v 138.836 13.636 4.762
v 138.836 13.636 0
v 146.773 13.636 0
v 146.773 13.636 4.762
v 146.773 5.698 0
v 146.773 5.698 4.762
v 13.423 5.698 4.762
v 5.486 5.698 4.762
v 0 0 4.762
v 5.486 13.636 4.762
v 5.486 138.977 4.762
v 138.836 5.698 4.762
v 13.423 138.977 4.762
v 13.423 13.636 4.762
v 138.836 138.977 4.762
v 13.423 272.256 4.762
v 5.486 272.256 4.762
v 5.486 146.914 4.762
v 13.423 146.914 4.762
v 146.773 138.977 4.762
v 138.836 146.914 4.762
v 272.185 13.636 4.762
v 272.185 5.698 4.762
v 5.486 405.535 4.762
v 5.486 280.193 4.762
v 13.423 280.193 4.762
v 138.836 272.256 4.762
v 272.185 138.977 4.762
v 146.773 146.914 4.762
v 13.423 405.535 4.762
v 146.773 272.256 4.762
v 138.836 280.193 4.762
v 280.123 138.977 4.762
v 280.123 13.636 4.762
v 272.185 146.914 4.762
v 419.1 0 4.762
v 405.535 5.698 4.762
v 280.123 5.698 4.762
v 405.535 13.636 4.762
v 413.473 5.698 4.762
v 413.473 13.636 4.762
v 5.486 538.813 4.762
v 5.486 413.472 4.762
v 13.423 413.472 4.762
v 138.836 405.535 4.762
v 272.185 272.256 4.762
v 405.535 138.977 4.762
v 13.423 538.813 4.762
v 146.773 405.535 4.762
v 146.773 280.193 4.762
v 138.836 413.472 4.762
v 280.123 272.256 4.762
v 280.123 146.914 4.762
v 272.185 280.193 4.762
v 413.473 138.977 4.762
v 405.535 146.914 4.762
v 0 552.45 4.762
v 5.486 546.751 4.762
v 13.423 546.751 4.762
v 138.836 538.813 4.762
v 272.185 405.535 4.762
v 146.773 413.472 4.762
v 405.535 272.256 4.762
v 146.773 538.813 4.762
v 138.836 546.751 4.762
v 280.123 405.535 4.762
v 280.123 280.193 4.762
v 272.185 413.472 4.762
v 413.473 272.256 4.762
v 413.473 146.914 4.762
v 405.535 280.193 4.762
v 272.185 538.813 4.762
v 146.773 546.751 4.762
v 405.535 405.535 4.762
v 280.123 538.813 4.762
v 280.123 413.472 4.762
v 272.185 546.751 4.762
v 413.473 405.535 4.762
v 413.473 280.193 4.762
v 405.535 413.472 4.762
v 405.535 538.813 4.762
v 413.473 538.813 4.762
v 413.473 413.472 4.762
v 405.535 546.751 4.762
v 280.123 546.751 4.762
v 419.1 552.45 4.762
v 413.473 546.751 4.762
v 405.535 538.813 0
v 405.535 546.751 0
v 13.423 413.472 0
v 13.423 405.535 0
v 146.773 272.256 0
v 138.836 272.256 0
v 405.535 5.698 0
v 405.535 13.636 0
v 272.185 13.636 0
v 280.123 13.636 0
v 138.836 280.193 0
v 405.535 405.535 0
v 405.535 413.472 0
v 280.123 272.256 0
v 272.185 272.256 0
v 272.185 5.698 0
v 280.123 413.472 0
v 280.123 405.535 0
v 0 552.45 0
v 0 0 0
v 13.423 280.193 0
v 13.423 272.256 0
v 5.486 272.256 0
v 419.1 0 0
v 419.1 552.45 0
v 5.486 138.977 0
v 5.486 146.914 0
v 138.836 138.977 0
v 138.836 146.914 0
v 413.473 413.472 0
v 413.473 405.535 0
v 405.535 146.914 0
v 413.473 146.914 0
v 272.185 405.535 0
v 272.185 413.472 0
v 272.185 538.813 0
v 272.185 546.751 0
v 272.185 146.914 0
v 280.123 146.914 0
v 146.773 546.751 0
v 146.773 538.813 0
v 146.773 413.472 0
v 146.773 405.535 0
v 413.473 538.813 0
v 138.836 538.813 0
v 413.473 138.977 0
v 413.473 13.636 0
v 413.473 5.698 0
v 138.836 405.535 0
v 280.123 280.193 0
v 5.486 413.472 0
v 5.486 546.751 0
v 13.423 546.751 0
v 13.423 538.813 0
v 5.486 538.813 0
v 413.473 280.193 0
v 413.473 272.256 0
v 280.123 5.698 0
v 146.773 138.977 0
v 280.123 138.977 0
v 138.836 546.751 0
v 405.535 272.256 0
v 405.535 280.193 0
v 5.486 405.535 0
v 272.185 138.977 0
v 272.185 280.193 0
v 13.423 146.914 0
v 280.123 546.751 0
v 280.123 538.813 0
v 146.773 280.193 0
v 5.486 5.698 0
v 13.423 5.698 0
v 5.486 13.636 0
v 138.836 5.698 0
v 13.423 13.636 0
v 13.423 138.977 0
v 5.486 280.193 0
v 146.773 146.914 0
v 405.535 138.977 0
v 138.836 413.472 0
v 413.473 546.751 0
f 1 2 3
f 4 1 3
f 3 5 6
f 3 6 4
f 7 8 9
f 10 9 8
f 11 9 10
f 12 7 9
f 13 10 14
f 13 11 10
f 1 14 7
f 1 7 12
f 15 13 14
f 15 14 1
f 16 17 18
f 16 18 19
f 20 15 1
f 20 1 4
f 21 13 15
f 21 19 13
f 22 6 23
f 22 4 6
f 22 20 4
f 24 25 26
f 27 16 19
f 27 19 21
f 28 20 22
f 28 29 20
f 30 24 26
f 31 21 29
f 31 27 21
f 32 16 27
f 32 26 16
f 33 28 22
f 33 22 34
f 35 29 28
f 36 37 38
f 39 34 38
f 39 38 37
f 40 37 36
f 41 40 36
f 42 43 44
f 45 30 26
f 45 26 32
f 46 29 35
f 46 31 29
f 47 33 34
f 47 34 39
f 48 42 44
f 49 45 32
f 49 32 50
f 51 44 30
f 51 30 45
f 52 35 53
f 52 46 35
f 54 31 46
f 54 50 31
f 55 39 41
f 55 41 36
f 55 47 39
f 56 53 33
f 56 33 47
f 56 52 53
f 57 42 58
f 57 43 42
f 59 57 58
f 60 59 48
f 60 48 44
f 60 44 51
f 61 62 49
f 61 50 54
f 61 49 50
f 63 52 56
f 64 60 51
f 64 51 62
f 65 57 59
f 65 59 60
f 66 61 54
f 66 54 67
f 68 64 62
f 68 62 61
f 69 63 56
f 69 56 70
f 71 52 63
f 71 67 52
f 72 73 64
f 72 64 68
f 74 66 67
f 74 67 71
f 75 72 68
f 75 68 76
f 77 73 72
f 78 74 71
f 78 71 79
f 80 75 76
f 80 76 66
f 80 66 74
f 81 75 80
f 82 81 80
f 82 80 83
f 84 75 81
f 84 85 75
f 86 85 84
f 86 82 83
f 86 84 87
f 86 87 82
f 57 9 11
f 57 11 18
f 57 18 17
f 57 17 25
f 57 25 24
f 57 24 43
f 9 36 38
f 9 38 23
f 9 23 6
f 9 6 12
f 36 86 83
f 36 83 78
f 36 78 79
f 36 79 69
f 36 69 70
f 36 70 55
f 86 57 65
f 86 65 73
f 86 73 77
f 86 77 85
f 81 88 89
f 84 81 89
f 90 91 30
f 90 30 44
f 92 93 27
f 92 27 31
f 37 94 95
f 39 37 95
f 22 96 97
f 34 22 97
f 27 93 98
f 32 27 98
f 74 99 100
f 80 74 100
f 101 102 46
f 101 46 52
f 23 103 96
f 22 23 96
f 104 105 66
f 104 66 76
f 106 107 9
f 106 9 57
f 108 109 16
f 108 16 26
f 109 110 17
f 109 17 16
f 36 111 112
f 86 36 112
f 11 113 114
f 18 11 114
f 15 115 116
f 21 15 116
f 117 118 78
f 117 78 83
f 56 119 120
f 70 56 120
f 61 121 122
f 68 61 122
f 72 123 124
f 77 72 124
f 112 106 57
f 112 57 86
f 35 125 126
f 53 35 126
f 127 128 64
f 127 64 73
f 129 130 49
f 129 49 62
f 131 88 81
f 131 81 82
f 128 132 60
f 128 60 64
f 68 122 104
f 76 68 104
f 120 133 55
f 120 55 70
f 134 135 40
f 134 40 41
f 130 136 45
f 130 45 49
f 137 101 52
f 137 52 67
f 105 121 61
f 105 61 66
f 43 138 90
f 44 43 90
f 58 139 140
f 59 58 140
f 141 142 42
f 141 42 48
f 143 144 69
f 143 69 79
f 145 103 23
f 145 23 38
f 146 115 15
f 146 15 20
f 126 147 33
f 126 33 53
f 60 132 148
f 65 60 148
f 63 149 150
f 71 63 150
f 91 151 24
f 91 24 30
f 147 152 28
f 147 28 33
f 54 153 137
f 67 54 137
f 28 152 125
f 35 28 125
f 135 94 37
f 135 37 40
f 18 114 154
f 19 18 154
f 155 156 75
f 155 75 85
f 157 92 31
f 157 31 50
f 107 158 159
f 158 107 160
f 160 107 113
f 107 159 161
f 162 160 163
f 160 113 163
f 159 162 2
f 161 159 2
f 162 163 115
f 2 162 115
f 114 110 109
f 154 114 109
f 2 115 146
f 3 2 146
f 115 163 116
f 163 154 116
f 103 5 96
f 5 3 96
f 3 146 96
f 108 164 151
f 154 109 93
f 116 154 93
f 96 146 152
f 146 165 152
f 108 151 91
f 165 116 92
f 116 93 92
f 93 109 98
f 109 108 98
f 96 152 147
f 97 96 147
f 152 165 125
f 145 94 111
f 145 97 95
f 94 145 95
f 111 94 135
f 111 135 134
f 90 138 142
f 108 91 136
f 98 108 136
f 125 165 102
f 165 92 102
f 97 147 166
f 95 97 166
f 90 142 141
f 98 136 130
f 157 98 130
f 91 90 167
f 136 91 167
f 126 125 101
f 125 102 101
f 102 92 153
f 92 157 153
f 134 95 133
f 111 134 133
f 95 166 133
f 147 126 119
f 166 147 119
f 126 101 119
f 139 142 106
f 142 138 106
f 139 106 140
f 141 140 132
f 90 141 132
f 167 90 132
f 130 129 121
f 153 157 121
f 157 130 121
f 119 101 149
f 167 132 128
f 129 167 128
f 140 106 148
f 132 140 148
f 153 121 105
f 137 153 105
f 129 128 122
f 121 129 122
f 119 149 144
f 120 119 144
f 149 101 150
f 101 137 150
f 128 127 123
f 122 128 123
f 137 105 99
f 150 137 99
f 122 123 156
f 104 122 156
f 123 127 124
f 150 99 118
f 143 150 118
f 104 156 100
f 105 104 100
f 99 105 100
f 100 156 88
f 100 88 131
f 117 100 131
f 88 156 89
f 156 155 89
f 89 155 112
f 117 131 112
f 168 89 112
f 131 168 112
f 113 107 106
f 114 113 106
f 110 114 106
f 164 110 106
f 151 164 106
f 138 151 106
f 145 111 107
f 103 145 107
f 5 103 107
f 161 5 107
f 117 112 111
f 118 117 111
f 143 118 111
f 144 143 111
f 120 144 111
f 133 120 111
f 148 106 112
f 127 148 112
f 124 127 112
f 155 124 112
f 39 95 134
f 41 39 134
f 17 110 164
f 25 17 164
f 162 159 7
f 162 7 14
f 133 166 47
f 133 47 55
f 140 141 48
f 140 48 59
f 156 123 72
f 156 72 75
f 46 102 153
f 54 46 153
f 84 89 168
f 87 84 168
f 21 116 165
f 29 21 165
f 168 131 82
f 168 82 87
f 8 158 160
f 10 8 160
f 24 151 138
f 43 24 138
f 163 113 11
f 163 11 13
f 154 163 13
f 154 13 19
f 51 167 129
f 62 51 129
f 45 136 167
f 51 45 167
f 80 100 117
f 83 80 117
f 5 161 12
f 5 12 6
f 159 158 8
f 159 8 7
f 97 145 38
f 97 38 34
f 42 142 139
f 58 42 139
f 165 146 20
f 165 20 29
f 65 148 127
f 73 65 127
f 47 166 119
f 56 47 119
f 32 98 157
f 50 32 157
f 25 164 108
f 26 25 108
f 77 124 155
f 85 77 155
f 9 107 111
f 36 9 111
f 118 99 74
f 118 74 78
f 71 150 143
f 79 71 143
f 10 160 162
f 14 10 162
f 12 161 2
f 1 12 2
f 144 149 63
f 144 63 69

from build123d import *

# Parameters (mm, degrees)
F0_W     = 419.1
F0_H     = 552.45
F0_W_2   = 7.9375
F0_H_2   = 7.9375
F1_DEPTH = 4.7625


with BuildPart() as f1:
    # F0 (on Top) → F1 (new body)
    with BuildSketch(Plane.XY):
        with Locations((209.55, 276.225)):
            Rectangle(F0_W, F0_H)
        with Locations((9.454559, 9.666916)):
            Rectangle(F0_W_2, F0_H_2, mode=Mode.SUBTRACT)
        with Locations((142.804305, 9.666916)):
            Rectangle(F0_W_2, F0_H_2, mode=Mode.SUBTRACT)
        with Locations((9.454559, 142.945695)):
            Rectangle(F0_W_2, F0_H_2, mode=Mode.SUBTRACT)
        with Locations((9.454559, 276.224473)):
            Rectangle(F0_W_2, F0_H_2, mode=Mode.SUBTRACT)
        with Locations((142.804305, 142.945695)):
            Rectangle(F0_W_2, F0_H_2, mode=Mode.SUBTRACT)
        with Locations((142.804305, 276.224473)):
            Rectangle(F0_W_2, F0_H_2, mode=Mode.SUBTRACT)
        with Locations((276.154051, 9.666916)):
            Rectangle(F0_W_2, F0_H_2, mode=Mode.SUBTRACT)
        with Locations((409.503797, 9.666916)):
            Rectangle(F0_W_2, F0_H_2, mode=Mode.SUBTRACT)
        with Locations((276.154051, 142.945695)):
            Rectangle(F0_W_2, F0_H_2, mode=Mode.SUBTRACT)
        with Locations((276.154051, 276.224473)):
            Rectangle(F0_W_2, F0_H_2, mode=Mode.SUBTRACT)
        with Locations((409.503797, 142.945695)):
            Rectangle(F0_W_2, F0_H_2, mode=Mode.SUBTRACT)
        with Locations((409.503797, 276.224473)):
            Rectangle(F0_W_2, F0_H_2, mode=Mode.SUBTRACT)
        with Locations((9.454559, 409.503252)):
            Rectangle(F0_W_2, F0_H_2, mode=Mode.SUBTRACT)
        with Locations((142.804305, 409.503252)):
            Rectangle(F0_W_2, F0_H_2, mode=Mode.SUBTRACT)
        with Locations((9.454559, 542.78203)):
            Rectangle(F0_W_2, F0_H_2, mode=Mode.SUBTRACT)
        with Locations((142.804305, 542.78203)):
            Rectangle(F0_W_2, F0_H_2, mode=Mode.SUBTRACT)
        with Locations((276.154051, 409.503252)):
            Rectangle(F0_W_2, F0_H_2, mode=Mode.SUBTRACT)
        with Locations((409.503797, 409.503252)):
            Rectangle(F0_W_2, F0_H_2, mode=Mode.SUBTRACT)
        with Locations((276.154051, 542.78203)):
            Rectangle(F0_W_2, F0_H_2, mode=Mode.SUBTRACT)
        with Locations((409.503797, 542.78203)):
            Rectangle(F0_W_2, F0_H_2, mode=Mode.SUBTRACT)
    extrude(amount=F1_DEPTH)


solid = f1.part
